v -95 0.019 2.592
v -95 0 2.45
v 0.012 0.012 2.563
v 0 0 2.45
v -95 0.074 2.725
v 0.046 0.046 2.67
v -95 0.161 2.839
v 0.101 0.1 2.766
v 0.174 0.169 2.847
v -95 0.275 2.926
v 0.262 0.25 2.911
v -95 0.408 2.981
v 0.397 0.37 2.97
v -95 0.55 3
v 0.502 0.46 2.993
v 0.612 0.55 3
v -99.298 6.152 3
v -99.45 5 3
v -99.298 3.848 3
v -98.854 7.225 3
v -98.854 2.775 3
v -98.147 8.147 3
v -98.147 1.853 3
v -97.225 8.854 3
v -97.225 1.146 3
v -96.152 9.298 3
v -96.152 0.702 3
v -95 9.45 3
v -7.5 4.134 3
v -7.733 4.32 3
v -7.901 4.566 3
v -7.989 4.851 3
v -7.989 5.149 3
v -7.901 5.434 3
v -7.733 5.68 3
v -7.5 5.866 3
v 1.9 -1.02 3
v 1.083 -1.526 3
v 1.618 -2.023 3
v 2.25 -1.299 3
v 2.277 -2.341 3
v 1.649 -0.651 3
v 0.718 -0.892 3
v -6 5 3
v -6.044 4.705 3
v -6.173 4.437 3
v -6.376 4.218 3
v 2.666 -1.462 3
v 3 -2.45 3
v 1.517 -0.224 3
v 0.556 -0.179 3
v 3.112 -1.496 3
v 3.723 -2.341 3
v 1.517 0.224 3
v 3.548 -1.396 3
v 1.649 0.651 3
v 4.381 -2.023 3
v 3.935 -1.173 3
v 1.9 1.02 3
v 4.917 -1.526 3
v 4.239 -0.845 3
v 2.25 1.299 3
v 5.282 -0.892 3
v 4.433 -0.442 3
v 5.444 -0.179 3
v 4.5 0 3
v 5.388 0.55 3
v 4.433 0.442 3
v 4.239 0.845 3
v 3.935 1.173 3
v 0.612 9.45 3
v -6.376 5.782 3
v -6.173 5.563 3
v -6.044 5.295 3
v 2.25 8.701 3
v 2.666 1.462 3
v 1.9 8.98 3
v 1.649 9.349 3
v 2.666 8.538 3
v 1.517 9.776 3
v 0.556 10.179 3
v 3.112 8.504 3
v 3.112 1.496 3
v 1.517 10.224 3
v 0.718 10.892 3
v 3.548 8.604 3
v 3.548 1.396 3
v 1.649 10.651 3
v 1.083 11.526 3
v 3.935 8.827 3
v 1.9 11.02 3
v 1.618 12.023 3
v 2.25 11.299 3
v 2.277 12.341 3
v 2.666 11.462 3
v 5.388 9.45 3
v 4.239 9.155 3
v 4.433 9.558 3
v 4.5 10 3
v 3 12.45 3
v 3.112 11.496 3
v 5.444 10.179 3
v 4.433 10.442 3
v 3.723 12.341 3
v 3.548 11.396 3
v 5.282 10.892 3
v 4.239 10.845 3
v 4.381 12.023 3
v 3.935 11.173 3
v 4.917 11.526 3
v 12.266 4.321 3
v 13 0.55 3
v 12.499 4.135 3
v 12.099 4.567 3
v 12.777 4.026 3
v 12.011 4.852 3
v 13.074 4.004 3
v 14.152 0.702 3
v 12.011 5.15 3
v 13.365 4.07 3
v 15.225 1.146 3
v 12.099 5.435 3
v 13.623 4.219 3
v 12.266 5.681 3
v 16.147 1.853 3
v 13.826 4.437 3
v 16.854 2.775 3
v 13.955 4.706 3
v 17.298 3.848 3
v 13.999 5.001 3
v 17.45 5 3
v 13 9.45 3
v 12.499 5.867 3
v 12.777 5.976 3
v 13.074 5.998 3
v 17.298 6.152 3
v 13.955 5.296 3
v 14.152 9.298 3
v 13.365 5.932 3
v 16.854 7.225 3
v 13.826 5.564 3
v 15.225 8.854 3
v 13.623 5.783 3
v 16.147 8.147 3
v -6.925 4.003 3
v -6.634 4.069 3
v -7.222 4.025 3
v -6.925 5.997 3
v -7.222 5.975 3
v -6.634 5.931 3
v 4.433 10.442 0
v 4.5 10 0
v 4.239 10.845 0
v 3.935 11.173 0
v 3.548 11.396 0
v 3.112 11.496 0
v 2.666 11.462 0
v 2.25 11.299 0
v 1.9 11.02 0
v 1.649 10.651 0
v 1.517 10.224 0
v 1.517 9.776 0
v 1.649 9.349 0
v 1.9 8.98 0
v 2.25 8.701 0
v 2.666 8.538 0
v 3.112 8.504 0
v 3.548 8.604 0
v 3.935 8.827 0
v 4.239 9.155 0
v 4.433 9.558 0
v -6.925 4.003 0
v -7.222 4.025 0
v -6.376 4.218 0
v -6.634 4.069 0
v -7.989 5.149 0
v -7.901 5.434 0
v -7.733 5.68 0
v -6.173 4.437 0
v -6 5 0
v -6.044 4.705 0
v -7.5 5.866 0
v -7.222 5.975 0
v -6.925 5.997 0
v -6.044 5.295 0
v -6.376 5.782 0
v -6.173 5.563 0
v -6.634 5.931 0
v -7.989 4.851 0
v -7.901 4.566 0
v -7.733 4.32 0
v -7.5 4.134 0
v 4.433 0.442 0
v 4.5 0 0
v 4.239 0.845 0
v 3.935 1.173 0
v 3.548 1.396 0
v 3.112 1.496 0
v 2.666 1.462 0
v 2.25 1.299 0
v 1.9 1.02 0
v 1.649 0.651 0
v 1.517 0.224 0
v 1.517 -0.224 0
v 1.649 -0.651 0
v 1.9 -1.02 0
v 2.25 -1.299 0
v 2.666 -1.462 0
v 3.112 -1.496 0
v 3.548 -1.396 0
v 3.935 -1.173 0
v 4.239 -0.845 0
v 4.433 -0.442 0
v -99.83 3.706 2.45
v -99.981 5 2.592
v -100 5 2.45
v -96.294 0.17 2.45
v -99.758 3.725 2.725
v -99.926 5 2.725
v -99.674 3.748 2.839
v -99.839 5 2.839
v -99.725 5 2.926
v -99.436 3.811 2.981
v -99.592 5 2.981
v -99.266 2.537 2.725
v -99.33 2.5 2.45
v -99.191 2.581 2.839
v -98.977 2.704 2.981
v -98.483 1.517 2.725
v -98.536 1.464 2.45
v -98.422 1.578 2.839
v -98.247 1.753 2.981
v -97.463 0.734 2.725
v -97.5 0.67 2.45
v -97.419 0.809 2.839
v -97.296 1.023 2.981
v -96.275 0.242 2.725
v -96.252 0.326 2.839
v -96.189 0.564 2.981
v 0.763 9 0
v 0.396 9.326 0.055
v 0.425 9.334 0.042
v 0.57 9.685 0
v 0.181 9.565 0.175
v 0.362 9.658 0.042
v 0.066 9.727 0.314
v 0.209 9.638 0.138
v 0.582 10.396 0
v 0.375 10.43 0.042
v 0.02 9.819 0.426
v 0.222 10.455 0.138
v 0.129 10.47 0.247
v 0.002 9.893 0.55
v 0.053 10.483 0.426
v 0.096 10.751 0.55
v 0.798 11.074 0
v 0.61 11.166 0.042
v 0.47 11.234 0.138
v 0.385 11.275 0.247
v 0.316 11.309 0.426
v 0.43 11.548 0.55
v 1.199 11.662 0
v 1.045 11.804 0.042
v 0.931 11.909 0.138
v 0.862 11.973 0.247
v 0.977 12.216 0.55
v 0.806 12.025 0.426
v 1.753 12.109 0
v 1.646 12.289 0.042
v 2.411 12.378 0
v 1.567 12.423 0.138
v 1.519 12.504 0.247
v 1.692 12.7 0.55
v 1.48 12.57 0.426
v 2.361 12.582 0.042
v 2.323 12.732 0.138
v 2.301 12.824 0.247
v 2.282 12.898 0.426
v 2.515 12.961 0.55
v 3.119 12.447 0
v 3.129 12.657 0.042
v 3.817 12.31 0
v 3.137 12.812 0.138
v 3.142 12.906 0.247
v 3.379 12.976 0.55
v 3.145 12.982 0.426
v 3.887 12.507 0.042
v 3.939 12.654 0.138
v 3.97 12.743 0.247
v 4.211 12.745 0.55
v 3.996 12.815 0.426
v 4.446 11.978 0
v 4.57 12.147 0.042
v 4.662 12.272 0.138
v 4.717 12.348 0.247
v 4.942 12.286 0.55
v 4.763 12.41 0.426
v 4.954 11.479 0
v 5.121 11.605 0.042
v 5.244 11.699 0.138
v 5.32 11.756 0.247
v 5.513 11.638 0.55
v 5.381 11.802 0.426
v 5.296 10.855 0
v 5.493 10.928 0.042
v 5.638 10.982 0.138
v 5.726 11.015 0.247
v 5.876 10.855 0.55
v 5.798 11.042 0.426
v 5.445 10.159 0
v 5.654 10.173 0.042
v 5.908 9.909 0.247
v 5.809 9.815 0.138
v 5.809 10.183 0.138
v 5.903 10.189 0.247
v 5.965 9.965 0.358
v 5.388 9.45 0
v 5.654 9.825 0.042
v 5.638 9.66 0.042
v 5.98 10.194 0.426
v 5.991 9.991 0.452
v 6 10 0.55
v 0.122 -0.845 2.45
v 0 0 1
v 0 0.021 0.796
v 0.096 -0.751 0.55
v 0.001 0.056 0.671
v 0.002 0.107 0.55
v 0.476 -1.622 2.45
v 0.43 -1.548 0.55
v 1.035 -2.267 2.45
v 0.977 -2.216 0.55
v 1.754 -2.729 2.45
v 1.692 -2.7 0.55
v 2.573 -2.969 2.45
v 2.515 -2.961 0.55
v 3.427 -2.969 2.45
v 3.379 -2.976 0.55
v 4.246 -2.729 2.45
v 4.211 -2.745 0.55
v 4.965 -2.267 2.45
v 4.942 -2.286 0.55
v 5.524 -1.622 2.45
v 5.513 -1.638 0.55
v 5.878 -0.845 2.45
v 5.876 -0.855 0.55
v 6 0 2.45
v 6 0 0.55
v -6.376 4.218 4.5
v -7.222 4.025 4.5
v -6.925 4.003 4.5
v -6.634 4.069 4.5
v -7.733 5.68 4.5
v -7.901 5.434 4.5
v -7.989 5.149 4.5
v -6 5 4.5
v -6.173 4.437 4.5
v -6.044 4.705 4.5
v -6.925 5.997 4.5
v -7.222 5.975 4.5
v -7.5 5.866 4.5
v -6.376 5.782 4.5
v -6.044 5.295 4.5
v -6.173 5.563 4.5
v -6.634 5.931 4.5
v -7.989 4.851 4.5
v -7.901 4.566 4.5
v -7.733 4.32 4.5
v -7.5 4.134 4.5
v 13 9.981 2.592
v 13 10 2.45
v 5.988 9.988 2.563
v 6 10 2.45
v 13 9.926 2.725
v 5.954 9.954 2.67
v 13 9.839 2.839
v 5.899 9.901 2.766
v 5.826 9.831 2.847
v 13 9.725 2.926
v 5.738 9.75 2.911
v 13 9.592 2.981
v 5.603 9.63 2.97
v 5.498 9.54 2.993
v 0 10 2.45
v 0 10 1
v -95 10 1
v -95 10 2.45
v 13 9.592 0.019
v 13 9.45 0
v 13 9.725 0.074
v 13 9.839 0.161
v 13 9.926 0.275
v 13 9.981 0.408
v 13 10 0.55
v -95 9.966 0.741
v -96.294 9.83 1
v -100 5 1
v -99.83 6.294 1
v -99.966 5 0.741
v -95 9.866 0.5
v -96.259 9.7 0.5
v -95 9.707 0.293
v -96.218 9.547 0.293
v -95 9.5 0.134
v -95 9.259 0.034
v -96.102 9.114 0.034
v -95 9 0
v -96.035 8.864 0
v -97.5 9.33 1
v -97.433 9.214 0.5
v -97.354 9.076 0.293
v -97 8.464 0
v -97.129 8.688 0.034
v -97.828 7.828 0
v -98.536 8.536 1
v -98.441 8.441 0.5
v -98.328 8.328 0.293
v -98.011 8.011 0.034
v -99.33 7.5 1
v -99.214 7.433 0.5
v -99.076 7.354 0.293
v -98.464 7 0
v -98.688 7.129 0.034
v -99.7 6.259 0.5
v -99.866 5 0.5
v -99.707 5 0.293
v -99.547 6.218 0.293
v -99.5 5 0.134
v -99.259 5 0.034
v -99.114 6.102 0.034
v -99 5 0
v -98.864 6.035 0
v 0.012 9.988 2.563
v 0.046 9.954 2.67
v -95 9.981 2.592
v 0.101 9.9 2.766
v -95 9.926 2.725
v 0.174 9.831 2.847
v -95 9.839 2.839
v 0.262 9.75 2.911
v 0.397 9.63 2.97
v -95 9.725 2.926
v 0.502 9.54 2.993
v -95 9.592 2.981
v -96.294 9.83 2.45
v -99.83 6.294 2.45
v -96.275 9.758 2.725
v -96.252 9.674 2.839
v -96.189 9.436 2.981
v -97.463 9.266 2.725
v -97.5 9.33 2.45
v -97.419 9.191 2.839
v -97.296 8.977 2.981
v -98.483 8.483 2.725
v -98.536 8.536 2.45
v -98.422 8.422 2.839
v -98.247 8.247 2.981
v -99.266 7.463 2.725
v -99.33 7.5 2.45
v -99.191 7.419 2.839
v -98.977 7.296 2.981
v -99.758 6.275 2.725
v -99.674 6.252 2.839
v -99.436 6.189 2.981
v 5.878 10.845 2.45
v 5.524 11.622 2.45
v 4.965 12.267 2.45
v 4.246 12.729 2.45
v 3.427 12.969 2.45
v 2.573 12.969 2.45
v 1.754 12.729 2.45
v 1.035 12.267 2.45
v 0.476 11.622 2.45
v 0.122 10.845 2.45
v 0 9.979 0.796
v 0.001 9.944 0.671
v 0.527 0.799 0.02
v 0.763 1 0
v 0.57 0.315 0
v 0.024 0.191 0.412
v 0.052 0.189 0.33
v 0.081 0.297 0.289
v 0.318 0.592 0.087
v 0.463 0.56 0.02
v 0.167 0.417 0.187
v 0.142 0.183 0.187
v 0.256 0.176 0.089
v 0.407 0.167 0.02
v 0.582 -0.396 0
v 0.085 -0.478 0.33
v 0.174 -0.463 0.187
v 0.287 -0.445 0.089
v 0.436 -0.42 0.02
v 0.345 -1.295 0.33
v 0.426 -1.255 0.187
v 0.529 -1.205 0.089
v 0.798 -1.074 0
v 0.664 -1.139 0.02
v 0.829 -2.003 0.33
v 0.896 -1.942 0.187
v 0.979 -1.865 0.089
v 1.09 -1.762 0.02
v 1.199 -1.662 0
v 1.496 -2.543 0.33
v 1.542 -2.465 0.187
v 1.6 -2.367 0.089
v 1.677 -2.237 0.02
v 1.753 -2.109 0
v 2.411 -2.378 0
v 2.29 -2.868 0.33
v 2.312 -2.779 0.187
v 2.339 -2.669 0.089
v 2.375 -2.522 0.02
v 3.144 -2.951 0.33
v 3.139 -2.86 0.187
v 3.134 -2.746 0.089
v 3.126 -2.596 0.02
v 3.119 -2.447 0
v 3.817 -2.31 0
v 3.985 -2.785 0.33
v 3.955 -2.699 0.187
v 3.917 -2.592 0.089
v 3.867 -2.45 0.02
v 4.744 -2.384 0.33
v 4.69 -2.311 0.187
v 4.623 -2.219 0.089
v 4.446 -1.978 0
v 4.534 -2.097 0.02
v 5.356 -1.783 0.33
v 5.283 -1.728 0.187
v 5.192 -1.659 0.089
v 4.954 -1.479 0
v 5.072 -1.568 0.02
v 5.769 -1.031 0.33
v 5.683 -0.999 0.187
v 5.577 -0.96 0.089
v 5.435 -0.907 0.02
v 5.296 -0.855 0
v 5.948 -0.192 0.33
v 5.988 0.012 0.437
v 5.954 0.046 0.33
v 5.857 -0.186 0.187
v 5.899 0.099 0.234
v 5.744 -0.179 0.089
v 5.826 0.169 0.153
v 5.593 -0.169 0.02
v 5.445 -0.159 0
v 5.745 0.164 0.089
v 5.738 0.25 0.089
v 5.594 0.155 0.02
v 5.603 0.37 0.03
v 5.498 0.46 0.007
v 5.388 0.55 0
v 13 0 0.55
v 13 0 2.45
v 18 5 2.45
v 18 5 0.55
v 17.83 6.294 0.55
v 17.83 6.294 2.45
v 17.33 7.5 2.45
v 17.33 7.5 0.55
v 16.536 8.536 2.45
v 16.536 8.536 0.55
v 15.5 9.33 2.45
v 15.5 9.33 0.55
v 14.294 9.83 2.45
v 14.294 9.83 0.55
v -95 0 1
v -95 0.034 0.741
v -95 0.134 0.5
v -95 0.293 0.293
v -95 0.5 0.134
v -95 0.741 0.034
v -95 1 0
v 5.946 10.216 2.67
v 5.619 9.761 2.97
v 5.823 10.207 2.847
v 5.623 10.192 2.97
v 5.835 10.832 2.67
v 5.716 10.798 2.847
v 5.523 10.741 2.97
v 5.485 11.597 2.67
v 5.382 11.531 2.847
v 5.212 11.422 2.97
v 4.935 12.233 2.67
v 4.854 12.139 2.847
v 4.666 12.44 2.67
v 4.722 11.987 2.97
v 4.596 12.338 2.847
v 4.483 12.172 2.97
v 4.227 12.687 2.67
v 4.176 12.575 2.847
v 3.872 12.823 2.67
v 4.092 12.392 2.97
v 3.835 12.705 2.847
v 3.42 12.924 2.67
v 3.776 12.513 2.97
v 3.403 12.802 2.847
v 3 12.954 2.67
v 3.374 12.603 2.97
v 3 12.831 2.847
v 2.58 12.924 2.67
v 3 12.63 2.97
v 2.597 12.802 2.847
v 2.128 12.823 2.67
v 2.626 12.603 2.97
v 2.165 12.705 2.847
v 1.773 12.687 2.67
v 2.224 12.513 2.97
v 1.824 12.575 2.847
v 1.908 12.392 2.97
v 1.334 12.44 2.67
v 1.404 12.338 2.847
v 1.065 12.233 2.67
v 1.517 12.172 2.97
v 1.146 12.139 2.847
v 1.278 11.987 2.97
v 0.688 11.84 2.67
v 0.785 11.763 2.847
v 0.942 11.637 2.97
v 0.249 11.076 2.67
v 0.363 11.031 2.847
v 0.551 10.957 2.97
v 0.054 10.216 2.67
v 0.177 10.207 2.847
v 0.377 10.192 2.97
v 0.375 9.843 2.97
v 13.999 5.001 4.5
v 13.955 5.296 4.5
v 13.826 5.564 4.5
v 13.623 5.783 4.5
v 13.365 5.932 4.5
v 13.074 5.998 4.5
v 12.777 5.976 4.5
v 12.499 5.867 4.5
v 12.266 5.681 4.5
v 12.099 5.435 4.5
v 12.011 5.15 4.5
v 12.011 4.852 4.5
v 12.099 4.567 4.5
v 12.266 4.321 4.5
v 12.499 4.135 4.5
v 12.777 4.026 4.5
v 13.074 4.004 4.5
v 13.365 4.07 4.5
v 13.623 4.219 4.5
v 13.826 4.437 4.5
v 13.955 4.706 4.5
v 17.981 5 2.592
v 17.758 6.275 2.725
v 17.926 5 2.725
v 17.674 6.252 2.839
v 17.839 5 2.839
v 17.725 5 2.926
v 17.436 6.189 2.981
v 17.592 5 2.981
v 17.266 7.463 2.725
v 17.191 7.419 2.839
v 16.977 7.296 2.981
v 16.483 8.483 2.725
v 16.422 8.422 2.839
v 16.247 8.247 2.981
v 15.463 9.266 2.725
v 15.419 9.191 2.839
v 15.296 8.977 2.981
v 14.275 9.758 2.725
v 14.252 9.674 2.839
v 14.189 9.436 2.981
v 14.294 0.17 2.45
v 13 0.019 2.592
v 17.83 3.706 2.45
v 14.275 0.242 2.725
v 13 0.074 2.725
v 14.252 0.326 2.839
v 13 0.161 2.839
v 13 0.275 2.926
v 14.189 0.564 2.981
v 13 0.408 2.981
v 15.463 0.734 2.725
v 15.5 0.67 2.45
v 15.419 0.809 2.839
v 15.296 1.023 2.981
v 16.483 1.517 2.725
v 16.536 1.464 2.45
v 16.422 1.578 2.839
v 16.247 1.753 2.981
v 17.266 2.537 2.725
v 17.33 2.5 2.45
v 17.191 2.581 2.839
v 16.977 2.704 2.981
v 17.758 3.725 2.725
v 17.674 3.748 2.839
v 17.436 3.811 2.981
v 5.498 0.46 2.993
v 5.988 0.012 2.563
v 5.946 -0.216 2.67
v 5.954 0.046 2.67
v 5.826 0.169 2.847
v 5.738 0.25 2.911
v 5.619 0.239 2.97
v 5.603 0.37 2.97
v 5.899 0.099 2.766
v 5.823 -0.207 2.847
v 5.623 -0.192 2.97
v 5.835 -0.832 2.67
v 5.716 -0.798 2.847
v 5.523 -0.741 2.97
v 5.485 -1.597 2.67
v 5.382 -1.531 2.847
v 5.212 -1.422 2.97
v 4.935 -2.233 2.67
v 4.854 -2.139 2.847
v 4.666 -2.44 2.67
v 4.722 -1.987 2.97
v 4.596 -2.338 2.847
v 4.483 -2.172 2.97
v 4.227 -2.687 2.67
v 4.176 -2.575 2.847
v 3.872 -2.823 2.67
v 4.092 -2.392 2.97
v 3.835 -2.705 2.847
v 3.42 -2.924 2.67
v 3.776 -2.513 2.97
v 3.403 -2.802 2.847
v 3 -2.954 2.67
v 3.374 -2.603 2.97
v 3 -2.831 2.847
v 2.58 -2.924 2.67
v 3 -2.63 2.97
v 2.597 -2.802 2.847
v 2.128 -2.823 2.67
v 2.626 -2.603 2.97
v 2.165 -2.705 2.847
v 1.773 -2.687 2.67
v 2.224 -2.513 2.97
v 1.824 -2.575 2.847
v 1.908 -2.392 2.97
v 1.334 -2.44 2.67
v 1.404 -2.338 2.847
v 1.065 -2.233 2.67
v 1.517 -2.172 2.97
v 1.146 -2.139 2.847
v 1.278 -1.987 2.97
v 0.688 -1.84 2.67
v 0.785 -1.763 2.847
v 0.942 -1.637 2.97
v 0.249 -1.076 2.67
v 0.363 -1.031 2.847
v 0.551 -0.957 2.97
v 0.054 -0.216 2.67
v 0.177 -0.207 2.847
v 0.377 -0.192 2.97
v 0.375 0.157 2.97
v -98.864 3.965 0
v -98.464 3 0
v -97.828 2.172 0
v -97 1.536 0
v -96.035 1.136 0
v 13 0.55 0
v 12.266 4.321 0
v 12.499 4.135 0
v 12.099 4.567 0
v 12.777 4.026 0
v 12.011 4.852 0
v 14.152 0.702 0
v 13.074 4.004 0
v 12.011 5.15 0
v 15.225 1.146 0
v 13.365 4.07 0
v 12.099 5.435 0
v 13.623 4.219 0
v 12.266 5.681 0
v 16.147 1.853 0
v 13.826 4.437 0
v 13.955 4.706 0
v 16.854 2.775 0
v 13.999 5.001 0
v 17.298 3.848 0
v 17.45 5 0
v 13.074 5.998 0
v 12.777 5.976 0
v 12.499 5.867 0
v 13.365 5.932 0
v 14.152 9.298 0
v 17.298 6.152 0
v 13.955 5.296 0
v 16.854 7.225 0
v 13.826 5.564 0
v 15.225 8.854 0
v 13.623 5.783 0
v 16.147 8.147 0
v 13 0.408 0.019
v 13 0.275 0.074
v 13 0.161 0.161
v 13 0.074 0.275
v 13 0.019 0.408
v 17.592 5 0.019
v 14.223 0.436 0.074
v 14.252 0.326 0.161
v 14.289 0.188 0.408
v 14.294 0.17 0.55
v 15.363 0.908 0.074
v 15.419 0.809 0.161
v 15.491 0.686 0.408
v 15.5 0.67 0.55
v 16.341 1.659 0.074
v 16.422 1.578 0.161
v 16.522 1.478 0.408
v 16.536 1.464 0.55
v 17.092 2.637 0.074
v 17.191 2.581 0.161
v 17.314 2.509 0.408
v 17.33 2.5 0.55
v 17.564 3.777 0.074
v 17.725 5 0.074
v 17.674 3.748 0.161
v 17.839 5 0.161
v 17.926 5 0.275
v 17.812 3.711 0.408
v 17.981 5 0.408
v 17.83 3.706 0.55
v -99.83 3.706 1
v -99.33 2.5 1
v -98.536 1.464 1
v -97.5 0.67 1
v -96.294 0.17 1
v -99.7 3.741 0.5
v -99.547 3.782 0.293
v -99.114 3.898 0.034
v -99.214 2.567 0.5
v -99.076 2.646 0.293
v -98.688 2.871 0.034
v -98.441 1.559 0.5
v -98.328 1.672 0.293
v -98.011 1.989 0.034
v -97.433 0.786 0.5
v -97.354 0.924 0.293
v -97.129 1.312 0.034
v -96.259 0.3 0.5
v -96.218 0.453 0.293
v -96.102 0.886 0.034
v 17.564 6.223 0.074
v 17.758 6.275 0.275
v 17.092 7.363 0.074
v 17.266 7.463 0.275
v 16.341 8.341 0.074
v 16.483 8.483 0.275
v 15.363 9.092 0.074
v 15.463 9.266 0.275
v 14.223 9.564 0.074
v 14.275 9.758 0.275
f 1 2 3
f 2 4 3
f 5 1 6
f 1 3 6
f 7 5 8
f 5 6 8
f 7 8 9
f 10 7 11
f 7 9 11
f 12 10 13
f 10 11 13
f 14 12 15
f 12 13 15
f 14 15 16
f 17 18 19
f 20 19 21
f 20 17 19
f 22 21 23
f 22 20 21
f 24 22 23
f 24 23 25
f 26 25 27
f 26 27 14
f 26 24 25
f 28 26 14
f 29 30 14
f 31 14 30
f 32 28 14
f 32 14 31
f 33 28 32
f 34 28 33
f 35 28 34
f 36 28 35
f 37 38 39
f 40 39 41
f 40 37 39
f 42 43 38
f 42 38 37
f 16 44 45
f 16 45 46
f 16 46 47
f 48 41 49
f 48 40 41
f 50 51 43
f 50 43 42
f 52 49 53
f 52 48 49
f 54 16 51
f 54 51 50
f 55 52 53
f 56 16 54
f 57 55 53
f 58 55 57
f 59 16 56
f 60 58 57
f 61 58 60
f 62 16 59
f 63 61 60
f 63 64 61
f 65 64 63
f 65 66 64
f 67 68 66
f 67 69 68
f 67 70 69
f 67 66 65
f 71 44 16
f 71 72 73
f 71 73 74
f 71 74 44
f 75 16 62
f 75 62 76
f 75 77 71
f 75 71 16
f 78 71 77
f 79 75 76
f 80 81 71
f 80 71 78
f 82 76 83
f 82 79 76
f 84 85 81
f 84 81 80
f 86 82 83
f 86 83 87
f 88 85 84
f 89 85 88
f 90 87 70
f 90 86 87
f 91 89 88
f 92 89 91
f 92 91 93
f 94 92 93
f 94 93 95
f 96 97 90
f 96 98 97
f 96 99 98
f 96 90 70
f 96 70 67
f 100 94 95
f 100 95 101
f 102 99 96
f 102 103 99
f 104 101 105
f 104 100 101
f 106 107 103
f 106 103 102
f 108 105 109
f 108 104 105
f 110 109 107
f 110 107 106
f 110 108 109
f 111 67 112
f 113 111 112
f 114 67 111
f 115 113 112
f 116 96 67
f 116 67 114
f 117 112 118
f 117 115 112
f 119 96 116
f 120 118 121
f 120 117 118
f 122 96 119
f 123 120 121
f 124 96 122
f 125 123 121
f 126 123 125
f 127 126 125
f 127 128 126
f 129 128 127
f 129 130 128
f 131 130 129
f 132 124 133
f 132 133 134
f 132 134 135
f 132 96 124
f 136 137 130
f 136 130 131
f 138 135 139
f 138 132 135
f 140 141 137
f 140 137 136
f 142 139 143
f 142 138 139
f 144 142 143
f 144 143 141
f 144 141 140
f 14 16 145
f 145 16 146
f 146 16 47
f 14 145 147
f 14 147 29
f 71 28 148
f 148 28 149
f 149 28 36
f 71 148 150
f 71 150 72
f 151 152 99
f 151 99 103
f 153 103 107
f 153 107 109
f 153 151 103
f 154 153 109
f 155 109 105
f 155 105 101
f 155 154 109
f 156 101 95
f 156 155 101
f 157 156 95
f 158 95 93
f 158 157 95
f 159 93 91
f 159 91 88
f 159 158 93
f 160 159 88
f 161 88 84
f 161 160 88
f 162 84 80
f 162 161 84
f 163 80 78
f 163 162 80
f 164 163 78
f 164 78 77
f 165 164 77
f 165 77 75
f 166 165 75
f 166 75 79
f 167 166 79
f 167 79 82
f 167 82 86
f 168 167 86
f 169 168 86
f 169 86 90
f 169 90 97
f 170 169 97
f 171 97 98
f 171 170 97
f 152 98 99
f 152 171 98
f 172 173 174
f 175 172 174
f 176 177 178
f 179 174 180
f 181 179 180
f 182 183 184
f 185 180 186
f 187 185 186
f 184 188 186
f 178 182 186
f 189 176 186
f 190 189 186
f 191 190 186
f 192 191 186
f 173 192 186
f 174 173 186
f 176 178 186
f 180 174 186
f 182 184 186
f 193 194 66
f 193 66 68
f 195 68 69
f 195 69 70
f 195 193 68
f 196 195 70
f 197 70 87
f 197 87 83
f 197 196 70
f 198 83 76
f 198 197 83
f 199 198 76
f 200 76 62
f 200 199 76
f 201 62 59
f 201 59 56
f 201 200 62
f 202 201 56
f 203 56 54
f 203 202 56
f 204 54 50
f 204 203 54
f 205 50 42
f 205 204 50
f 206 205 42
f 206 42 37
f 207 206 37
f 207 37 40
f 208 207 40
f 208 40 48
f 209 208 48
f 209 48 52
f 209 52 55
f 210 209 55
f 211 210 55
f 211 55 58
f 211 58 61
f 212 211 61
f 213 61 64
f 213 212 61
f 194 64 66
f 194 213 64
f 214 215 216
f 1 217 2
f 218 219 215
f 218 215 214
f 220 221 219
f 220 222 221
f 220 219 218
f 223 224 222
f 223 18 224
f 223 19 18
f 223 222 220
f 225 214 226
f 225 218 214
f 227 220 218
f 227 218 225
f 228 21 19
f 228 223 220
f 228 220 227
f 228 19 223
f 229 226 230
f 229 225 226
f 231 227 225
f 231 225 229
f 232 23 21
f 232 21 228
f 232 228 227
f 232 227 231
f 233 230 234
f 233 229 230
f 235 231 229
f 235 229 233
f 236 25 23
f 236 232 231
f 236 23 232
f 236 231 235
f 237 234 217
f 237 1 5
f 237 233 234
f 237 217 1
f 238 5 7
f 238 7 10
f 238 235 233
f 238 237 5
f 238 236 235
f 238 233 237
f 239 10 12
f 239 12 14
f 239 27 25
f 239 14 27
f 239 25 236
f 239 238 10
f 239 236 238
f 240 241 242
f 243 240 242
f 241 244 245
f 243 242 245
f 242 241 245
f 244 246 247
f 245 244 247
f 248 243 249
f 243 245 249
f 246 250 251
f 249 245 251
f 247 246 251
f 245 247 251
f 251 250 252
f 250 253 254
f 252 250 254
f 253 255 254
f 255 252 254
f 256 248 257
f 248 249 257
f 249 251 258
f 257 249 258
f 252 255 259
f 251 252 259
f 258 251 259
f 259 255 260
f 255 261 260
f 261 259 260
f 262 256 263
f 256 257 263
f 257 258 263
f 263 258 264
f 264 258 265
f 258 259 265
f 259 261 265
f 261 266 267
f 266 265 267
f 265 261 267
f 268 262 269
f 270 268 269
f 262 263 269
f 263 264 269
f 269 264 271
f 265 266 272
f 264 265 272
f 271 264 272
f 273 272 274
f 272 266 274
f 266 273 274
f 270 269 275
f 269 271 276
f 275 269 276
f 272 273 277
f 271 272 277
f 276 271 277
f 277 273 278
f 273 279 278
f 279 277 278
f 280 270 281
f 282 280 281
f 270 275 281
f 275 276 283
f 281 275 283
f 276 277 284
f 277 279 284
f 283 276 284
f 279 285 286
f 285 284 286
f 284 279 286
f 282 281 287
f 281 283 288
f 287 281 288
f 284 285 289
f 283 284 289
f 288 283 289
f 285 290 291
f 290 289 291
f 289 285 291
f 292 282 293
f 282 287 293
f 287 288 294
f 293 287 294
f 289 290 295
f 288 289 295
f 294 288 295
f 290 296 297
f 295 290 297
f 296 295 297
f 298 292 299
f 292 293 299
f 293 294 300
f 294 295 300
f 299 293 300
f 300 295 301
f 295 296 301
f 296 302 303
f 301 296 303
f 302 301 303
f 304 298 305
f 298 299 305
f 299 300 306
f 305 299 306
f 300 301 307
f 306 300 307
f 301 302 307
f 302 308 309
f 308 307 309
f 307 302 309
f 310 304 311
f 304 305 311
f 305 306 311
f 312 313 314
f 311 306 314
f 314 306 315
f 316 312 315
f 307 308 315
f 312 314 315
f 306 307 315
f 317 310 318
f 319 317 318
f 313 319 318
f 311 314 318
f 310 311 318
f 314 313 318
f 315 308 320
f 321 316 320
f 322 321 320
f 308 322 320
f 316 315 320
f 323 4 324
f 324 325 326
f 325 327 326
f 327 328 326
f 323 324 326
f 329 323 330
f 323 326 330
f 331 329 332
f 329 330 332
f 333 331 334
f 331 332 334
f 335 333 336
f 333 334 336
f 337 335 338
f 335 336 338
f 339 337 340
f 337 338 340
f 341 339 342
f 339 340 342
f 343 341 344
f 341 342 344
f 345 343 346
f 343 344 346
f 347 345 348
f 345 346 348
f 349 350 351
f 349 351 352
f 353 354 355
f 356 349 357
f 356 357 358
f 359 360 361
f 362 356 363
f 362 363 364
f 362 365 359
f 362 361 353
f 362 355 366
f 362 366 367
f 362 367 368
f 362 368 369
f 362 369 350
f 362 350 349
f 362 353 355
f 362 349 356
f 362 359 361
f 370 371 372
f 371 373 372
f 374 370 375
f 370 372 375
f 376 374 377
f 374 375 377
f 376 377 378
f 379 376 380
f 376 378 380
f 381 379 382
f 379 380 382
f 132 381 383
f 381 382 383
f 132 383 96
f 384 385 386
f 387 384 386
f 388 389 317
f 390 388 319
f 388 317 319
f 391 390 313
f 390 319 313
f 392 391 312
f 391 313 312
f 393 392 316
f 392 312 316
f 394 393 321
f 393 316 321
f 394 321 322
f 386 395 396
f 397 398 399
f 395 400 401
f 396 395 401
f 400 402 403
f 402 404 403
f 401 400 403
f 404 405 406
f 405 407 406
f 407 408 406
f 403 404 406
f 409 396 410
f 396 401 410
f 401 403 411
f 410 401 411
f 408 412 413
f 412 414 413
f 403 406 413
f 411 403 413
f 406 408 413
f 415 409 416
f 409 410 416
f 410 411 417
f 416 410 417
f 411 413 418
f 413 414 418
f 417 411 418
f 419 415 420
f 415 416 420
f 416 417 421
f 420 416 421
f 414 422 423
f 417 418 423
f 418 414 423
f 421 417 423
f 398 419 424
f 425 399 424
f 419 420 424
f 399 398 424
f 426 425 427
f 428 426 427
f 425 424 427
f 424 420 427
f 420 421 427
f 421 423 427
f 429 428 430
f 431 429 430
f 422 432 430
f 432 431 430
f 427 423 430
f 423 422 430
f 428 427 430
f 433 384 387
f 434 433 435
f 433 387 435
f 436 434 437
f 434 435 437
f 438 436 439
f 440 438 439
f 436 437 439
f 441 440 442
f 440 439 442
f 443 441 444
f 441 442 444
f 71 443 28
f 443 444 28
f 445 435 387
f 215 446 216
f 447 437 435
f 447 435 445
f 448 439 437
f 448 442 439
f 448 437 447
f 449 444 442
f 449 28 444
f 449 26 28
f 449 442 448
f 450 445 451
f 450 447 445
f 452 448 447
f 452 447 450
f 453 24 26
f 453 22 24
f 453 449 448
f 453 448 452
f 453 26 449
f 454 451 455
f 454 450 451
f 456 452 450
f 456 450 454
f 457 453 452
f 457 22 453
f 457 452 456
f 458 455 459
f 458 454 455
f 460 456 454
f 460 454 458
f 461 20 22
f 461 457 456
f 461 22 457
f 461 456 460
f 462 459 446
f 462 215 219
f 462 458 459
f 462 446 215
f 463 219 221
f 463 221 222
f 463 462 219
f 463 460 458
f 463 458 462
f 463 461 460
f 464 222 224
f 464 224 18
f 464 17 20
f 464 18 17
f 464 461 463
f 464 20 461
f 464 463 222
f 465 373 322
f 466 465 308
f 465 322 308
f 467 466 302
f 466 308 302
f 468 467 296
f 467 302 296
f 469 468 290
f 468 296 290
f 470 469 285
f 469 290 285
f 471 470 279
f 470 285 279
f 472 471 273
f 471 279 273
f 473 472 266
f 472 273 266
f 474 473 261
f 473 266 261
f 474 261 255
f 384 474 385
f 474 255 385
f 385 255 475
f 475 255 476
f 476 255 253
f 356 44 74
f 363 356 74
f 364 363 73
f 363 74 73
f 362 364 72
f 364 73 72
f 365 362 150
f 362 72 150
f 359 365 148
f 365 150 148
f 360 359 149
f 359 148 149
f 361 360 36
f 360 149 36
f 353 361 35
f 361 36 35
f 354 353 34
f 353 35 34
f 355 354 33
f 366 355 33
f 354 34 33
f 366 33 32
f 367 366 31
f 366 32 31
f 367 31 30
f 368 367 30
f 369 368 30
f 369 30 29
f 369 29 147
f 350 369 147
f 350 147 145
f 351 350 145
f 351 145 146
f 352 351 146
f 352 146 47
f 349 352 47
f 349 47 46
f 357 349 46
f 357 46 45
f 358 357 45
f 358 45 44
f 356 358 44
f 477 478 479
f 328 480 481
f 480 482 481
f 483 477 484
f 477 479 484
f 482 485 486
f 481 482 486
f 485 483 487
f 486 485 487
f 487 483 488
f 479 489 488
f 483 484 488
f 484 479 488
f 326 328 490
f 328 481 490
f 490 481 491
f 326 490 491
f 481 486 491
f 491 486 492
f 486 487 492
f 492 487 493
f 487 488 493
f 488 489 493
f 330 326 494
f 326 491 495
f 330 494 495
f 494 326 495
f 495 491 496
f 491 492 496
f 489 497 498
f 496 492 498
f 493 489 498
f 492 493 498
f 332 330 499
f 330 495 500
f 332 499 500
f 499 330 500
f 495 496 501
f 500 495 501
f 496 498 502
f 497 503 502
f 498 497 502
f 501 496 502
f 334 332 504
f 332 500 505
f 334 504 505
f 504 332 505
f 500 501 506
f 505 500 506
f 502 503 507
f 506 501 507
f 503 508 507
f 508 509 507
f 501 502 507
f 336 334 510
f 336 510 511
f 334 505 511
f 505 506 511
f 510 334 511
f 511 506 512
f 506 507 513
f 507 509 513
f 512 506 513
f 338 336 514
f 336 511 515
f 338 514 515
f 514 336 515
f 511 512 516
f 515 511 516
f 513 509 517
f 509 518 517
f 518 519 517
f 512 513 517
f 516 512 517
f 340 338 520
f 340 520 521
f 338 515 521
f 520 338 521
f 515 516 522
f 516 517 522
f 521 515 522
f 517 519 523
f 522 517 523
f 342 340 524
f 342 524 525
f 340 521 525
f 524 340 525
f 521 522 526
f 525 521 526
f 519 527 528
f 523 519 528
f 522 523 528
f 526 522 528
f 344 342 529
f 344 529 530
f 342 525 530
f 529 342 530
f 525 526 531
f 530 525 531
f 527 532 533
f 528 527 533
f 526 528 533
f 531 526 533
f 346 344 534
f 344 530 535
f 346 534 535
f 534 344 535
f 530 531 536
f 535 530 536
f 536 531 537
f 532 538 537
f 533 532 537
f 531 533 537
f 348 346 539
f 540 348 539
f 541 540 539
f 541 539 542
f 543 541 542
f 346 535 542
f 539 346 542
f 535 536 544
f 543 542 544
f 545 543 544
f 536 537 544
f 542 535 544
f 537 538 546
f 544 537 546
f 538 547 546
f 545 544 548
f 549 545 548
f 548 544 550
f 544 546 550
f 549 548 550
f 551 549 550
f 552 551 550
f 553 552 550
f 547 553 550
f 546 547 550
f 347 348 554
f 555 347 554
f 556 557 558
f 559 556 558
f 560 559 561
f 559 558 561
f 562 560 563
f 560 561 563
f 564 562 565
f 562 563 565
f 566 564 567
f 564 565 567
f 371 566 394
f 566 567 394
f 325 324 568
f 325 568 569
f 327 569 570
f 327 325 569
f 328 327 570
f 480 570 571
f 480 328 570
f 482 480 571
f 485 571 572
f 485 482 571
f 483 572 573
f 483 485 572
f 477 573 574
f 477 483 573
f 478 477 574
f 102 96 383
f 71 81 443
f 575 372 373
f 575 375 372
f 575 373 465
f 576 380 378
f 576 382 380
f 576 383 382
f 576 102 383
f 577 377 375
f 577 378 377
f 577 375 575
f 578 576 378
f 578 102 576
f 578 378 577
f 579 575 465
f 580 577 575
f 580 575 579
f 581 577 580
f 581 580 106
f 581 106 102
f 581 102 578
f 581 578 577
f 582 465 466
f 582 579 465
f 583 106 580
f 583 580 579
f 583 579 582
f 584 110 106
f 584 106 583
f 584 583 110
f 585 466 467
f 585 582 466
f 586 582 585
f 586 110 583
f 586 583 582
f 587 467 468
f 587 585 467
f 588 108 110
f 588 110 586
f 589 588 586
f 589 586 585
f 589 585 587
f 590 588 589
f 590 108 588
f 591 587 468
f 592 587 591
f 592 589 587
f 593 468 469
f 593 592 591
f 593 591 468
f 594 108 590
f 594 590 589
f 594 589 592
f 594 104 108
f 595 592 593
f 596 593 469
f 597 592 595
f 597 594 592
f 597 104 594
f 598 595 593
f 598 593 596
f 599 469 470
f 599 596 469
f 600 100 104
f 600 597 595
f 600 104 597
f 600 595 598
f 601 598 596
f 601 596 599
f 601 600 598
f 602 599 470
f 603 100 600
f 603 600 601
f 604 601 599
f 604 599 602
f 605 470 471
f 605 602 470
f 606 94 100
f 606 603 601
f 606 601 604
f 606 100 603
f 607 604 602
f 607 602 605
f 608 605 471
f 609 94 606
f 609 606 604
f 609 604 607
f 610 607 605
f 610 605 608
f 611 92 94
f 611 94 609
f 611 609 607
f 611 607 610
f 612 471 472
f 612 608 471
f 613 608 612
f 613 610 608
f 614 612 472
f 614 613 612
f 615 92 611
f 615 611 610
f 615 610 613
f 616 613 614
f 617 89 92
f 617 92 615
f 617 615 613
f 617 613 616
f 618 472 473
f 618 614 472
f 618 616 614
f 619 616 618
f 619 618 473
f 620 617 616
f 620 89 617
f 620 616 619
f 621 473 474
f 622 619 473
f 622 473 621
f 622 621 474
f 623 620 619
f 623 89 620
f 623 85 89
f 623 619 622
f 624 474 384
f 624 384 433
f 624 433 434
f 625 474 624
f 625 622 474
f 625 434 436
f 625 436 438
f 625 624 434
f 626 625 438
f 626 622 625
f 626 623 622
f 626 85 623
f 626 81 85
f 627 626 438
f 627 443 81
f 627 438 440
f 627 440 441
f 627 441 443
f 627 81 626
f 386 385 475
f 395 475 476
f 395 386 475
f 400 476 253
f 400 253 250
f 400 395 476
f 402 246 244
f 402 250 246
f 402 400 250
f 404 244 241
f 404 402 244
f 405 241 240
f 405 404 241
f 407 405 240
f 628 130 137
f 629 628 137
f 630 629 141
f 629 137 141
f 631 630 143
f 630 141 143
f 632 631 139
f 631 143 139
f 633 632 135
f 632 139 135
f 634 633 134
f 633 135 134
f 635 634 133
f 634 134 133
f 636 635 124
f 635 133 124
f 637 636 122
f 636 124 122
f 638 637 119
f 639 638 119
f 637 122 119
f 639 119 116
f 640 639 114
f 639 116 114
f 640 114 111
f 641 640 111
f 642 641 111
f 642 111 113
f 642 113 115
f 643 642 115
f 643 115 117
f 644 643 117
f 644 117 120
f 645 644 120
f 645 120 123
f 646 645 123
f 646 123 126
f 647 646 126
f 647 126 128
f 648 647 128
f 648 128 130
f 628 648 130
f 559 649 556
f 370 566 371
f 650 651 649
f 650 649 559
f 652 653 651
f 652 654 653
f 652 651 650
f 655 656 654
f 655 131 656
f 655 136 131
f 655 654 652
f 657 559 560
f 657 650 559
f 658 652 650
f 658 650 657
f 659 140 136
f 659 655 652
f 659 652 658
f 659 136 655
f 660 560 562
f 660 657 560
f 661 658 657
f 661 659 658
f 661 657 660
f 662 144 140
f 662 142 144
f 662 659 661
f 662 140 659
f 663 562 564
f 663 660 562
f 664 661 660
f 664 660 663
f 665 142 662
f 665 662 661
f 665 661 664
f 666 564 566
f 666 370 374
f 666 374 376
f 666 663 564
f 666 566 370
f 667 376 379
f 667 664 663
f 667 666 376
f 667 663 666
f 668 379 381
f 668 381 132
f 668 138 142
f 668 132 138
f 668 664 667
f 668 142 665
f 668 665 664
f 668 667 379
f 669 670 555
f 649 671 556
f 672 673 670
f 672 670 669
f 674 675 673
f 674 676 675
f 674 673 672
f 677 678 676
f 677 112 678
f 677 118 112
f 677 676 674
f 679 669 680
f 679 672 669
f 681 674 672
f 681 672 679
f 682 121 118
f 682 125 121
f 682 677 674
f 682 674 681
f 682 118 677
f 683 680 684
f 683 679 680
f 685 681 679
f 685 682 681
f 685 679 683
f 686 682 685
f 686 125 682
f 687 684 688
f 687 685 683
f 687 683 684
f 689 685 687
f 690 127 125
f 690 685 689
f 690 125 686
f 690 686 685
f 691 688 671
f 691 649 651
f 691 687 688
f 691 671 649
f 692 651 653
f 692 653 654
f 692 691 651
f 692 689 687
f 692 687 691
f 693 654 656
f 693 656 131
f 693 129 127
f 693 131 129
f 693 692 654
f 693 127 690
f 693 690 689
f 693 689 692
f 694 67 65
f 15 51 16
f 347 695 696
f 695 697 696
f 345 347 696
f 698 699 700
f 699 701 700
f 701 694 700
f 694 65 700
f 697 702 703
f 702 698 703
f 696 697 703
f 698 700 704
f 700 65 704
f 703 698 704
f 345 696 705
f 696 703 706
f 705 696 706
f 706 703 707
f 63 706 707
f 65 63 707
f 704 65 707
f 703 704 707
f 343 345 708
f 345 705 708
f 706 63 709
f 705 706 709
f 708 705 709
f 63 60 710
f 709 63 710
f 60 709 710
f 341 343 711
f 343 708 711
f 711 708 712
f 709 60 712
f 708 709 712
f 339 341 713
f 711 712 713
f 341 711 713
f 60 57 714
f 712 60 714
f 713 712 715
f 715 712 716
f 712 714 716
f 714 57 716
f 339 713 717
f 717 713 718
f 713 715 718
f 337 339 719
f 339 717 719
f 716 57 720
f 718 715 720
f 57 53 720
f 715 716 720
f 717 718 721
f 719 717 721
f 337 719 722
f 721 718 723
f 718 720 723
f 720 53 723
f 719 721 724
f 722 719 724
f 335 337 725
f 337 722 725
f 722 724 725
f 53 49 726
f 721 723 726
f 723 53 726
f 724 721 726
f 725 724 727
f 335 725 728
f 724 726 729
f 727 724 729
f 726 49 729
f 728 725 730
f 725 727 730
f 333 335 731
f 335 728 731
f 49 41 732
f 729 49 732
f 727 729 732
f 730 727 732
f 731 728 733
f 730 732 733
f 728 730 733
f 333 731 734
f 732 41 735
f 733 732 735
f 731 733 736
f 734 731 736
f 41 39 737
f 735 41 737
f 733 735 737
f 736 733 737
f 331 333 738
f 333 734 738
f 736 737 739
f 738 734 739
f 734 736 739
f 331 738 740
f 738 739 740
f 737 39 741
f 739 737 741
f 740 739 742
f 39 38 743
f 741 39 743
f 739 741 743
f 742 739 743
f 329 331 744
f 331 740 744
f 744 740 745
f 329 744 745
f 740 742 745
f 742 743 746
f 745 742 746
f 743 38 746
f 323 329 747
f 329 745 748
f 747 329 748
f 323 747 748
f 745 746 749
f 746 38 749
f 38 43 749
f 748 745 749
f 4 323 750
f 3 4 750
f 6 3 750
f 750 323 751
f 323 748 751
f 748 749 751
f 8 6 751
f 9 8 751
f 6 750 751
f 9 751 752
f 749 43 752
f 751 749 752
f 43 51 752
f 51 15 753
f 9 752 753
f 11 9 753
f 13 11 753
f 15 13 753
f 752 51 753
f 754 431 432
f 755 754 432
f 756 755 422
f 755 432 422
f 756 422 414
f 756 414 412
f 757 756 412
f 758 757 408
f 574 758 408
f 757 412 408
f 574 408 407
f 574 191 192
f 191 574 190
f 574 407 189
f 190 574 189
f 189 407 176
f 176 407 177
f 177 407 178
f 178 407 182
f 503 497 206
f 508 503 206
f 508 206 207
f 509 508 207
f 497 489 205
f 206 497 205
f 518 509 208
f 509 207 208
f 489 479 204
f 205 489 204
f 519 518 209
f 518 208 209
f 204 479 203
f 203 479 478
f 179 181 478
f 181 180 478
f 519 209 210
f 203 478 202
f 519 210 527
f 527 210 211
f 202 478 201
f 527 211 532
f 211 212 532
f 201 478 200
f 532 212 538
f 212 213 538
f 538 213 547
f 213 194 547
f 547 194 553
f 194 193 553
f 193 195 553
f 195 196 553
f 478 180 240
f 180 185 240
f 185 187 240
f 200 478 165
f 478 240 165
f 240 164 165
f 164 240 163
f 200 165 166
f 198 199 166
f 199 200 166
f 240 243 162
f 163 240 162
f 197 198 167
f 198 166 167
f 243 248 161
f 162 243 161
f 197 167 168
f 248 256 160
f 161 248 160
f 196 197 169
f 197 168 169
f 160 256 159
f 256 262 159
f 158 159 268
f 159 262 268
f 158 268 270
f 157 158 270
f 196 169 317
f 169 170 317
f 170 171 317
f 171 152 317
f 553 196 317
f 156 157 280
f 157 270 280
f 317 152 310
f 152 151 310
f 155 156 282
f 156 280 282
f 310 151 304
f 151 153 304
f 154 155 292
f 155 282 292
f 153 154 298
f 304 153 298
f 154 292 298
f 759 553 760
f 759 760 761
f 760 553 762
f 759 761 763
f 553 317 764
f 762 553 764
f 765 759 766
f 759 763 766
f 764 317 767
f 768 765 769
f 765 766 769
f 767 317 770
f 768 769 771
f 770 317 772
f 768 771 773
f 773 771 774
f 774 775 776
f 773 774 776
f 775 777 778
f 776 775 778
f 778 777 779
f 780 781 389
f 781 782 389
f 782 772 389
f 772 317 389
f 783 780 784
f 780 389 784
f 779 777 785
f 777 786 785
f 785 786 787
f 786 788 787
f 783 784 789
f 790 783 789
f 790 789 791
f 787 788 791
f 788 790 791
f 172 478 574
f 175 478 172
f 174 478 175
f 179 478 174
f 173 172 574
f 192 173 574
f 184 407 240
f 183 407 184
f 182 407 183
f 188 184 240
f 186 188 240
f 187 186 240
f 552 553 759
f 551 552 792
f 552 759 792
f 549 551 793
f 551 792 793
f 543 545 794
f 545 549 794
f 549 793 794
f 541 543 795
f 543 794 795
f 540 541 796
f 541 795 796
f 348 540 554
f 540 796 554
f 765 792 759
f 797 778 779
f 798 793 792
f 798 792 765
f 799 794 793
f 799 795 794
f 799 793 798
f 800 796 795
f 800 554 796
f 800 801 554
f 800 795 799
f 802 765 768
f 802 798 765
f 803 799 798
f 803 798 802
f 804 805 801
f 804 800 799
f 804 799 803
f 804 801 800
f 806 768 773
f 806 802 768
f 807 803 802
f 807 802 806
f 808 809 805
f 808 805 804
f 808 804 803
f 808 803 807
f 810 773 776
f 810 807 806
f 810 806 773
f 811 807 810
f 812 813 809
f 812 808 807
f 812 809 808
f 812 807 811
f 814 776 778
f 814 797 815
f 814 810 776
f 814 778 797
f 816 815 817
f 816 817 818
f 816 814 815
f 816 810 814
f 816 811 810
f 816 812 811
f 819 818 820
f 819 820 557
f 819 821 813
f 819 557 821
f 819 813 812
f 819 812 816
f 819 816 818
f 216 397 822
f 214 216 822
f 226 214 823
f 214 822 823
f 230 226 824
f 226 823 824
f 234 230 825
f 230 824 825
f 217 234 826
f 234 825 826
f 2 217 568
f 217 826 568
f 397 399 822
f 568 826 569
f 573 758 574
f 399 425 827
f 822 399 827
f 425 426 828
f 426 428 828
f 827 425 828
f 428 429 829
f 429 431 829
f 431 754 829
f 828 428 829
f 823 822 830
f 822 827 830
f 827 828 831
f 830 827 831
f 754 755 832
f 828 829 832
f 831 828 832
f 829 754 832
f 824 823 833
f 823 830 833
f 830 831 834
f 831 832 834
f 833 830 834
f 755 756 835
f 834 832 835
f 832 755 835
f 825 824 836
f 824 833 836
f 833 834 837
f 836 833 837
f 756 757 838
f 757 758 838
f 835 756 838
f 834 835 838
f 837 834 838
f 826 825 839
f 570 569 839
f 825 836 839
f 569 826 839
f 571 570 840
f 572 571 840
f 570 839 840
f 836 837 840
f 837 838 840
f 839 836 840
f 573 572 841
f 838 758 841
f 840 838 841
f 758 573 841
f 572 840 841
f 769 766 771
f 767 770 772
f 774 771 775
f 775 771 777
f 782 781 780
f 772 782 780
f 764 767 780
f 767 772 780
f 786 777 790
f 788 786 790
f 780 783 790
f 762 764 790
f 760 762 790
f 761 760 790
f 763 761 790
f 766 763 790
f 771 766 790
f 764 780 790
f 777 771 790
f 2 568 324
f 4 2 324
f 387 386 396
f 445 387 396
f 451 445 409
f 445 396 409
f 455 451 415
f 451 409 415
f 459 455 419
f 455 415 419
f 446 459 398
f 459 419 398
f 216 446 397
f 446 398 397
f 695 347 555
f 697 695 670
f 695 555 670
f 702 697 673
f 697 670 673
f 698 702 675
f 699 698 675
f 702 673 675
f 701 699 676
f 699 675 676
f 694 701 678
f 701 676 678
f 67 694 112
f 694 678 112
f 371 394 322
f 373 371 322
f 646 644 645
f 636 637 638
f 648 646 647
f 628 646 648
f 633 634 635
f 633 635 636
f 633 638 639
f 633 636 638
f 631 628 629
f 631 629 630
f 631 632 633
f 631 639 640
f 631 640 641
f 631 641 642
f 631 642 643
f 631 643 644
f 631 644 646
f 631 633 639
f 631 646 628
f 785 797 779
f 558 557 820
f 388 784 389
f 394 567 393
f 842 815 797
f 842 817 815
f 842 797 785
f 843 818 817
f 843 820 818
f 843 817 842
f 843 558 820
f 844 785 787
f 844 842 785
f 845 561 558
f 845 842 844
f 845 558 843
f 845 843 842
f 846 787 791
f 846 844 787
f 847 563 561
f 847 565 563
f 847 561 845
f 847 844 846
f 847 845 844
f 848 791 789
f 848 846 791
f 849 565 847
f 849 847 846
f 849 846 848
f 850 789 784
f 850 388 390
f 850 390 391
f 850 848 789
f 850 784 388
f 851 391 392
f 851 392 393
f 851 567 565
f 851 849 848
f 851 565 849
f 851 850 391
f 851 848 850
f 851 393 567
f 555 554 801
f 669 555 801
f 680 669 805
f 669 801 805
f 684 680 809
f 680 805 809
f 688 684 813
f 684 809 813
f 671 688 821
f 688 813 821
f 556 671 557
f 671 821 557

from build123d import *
from build123d import SkipClean  # not in build123d's __all__

# Parameters (mm, degrees)
F0_R     = 1.5
F1_DEPTH = 3
F2_R     = 0.55
F3_R     = 1
F4_R     = 0.5499
F5_R     = 1
F6_DEPTH = 4.5


# Not quite as in the source:
# - a fillet or chamfer is up to 0.001 mm smaller than in the source, because OpenCascade refuses the exact size
# - a feature names something its author has since deleted; it is built from what else it names


with BuildPart() as f1:
    # F0 (on Top) → F1 (new body)
    with BuildSketch(Plane.XY):
        with BuildLine():
            Line((-95, 0), (0, 0))
            ThreePointArc((0, 0), (3, -3), (6, 0))
            Line((6, 0), (13, 0))
            ThreePointArc((13, 0), (16.5355339059, 1.4644660941), (18, 5))
            ThreePointArc((18, 5), (16.5355339059, 8.5355339059), (13, 10))
            Line((13, 10), (6, 10))
            ThreePointArc((6, 10), (3, 13), (0, 10))
            Line((0, 10), (-95, 10))
            ThreePointArc((-95, 10), (-98.5355339059, 8.5355339059), (-100, 5))
            ThreePointArc((-100, 5), (-98.5355339059, 1.4644660941), (-95, 0))
        make_face()
        with Locations((3, 0)):
            Circle(F0_R, mode=Mode.SUBTRACT)
        with Locations((3, 10)):
            Circle(F0_R, mode=Mode.SUBTRACT)
    extrude(amount=F1_DEPTH)

    # F2
    f2_edges = [f1.edges().sort_by_distance(p)[0] for p in [
        (-47.5, 0, 3),
    ]]
    fillet(f2_edges, radius=F2_R)

    # F3
    f3_edges = [f1.edges().sort_by_distance(p)[0] for p in [
        (-47.5, 0, 0),
    ]]
    fillet(f3_edges, radius=F3_R)

    # F4 (radius 0.55 in the source; OpenCascade refuses exactly that, so slightly less here)
    f4_edges = [f1.edges().sort_by_distance(p)[0] for p in [
        (3, -3, 3),
        (3, 13, 3),
        (3, -3, 0),
        (3, 13, 0),
        (9.5, 0, 3),
        (18, 5, 3),
        (18, 5, 0),
        (9.5, 0, 0),
        (9.5, 10, 0),
        (9.5, 10, 3),
    ]]
    fillet(f4_edges, radius=F4_R)

    # F5 (on Top) → F6 (join)
    with BuildSketch(Plane.XY):
        with Locations((12.9994759336, 5.0007845275)):
            Circle(F5_R)
        with Locations((-6.9997087121, 5.0000692718)):
            Circle(F5_R)
    with SkipClean():  # cleaning this boolean's faces spoils the solid; the shape is the same uncleaned
        extrude(amount=F6_DEPTH)


solid = f1.part
